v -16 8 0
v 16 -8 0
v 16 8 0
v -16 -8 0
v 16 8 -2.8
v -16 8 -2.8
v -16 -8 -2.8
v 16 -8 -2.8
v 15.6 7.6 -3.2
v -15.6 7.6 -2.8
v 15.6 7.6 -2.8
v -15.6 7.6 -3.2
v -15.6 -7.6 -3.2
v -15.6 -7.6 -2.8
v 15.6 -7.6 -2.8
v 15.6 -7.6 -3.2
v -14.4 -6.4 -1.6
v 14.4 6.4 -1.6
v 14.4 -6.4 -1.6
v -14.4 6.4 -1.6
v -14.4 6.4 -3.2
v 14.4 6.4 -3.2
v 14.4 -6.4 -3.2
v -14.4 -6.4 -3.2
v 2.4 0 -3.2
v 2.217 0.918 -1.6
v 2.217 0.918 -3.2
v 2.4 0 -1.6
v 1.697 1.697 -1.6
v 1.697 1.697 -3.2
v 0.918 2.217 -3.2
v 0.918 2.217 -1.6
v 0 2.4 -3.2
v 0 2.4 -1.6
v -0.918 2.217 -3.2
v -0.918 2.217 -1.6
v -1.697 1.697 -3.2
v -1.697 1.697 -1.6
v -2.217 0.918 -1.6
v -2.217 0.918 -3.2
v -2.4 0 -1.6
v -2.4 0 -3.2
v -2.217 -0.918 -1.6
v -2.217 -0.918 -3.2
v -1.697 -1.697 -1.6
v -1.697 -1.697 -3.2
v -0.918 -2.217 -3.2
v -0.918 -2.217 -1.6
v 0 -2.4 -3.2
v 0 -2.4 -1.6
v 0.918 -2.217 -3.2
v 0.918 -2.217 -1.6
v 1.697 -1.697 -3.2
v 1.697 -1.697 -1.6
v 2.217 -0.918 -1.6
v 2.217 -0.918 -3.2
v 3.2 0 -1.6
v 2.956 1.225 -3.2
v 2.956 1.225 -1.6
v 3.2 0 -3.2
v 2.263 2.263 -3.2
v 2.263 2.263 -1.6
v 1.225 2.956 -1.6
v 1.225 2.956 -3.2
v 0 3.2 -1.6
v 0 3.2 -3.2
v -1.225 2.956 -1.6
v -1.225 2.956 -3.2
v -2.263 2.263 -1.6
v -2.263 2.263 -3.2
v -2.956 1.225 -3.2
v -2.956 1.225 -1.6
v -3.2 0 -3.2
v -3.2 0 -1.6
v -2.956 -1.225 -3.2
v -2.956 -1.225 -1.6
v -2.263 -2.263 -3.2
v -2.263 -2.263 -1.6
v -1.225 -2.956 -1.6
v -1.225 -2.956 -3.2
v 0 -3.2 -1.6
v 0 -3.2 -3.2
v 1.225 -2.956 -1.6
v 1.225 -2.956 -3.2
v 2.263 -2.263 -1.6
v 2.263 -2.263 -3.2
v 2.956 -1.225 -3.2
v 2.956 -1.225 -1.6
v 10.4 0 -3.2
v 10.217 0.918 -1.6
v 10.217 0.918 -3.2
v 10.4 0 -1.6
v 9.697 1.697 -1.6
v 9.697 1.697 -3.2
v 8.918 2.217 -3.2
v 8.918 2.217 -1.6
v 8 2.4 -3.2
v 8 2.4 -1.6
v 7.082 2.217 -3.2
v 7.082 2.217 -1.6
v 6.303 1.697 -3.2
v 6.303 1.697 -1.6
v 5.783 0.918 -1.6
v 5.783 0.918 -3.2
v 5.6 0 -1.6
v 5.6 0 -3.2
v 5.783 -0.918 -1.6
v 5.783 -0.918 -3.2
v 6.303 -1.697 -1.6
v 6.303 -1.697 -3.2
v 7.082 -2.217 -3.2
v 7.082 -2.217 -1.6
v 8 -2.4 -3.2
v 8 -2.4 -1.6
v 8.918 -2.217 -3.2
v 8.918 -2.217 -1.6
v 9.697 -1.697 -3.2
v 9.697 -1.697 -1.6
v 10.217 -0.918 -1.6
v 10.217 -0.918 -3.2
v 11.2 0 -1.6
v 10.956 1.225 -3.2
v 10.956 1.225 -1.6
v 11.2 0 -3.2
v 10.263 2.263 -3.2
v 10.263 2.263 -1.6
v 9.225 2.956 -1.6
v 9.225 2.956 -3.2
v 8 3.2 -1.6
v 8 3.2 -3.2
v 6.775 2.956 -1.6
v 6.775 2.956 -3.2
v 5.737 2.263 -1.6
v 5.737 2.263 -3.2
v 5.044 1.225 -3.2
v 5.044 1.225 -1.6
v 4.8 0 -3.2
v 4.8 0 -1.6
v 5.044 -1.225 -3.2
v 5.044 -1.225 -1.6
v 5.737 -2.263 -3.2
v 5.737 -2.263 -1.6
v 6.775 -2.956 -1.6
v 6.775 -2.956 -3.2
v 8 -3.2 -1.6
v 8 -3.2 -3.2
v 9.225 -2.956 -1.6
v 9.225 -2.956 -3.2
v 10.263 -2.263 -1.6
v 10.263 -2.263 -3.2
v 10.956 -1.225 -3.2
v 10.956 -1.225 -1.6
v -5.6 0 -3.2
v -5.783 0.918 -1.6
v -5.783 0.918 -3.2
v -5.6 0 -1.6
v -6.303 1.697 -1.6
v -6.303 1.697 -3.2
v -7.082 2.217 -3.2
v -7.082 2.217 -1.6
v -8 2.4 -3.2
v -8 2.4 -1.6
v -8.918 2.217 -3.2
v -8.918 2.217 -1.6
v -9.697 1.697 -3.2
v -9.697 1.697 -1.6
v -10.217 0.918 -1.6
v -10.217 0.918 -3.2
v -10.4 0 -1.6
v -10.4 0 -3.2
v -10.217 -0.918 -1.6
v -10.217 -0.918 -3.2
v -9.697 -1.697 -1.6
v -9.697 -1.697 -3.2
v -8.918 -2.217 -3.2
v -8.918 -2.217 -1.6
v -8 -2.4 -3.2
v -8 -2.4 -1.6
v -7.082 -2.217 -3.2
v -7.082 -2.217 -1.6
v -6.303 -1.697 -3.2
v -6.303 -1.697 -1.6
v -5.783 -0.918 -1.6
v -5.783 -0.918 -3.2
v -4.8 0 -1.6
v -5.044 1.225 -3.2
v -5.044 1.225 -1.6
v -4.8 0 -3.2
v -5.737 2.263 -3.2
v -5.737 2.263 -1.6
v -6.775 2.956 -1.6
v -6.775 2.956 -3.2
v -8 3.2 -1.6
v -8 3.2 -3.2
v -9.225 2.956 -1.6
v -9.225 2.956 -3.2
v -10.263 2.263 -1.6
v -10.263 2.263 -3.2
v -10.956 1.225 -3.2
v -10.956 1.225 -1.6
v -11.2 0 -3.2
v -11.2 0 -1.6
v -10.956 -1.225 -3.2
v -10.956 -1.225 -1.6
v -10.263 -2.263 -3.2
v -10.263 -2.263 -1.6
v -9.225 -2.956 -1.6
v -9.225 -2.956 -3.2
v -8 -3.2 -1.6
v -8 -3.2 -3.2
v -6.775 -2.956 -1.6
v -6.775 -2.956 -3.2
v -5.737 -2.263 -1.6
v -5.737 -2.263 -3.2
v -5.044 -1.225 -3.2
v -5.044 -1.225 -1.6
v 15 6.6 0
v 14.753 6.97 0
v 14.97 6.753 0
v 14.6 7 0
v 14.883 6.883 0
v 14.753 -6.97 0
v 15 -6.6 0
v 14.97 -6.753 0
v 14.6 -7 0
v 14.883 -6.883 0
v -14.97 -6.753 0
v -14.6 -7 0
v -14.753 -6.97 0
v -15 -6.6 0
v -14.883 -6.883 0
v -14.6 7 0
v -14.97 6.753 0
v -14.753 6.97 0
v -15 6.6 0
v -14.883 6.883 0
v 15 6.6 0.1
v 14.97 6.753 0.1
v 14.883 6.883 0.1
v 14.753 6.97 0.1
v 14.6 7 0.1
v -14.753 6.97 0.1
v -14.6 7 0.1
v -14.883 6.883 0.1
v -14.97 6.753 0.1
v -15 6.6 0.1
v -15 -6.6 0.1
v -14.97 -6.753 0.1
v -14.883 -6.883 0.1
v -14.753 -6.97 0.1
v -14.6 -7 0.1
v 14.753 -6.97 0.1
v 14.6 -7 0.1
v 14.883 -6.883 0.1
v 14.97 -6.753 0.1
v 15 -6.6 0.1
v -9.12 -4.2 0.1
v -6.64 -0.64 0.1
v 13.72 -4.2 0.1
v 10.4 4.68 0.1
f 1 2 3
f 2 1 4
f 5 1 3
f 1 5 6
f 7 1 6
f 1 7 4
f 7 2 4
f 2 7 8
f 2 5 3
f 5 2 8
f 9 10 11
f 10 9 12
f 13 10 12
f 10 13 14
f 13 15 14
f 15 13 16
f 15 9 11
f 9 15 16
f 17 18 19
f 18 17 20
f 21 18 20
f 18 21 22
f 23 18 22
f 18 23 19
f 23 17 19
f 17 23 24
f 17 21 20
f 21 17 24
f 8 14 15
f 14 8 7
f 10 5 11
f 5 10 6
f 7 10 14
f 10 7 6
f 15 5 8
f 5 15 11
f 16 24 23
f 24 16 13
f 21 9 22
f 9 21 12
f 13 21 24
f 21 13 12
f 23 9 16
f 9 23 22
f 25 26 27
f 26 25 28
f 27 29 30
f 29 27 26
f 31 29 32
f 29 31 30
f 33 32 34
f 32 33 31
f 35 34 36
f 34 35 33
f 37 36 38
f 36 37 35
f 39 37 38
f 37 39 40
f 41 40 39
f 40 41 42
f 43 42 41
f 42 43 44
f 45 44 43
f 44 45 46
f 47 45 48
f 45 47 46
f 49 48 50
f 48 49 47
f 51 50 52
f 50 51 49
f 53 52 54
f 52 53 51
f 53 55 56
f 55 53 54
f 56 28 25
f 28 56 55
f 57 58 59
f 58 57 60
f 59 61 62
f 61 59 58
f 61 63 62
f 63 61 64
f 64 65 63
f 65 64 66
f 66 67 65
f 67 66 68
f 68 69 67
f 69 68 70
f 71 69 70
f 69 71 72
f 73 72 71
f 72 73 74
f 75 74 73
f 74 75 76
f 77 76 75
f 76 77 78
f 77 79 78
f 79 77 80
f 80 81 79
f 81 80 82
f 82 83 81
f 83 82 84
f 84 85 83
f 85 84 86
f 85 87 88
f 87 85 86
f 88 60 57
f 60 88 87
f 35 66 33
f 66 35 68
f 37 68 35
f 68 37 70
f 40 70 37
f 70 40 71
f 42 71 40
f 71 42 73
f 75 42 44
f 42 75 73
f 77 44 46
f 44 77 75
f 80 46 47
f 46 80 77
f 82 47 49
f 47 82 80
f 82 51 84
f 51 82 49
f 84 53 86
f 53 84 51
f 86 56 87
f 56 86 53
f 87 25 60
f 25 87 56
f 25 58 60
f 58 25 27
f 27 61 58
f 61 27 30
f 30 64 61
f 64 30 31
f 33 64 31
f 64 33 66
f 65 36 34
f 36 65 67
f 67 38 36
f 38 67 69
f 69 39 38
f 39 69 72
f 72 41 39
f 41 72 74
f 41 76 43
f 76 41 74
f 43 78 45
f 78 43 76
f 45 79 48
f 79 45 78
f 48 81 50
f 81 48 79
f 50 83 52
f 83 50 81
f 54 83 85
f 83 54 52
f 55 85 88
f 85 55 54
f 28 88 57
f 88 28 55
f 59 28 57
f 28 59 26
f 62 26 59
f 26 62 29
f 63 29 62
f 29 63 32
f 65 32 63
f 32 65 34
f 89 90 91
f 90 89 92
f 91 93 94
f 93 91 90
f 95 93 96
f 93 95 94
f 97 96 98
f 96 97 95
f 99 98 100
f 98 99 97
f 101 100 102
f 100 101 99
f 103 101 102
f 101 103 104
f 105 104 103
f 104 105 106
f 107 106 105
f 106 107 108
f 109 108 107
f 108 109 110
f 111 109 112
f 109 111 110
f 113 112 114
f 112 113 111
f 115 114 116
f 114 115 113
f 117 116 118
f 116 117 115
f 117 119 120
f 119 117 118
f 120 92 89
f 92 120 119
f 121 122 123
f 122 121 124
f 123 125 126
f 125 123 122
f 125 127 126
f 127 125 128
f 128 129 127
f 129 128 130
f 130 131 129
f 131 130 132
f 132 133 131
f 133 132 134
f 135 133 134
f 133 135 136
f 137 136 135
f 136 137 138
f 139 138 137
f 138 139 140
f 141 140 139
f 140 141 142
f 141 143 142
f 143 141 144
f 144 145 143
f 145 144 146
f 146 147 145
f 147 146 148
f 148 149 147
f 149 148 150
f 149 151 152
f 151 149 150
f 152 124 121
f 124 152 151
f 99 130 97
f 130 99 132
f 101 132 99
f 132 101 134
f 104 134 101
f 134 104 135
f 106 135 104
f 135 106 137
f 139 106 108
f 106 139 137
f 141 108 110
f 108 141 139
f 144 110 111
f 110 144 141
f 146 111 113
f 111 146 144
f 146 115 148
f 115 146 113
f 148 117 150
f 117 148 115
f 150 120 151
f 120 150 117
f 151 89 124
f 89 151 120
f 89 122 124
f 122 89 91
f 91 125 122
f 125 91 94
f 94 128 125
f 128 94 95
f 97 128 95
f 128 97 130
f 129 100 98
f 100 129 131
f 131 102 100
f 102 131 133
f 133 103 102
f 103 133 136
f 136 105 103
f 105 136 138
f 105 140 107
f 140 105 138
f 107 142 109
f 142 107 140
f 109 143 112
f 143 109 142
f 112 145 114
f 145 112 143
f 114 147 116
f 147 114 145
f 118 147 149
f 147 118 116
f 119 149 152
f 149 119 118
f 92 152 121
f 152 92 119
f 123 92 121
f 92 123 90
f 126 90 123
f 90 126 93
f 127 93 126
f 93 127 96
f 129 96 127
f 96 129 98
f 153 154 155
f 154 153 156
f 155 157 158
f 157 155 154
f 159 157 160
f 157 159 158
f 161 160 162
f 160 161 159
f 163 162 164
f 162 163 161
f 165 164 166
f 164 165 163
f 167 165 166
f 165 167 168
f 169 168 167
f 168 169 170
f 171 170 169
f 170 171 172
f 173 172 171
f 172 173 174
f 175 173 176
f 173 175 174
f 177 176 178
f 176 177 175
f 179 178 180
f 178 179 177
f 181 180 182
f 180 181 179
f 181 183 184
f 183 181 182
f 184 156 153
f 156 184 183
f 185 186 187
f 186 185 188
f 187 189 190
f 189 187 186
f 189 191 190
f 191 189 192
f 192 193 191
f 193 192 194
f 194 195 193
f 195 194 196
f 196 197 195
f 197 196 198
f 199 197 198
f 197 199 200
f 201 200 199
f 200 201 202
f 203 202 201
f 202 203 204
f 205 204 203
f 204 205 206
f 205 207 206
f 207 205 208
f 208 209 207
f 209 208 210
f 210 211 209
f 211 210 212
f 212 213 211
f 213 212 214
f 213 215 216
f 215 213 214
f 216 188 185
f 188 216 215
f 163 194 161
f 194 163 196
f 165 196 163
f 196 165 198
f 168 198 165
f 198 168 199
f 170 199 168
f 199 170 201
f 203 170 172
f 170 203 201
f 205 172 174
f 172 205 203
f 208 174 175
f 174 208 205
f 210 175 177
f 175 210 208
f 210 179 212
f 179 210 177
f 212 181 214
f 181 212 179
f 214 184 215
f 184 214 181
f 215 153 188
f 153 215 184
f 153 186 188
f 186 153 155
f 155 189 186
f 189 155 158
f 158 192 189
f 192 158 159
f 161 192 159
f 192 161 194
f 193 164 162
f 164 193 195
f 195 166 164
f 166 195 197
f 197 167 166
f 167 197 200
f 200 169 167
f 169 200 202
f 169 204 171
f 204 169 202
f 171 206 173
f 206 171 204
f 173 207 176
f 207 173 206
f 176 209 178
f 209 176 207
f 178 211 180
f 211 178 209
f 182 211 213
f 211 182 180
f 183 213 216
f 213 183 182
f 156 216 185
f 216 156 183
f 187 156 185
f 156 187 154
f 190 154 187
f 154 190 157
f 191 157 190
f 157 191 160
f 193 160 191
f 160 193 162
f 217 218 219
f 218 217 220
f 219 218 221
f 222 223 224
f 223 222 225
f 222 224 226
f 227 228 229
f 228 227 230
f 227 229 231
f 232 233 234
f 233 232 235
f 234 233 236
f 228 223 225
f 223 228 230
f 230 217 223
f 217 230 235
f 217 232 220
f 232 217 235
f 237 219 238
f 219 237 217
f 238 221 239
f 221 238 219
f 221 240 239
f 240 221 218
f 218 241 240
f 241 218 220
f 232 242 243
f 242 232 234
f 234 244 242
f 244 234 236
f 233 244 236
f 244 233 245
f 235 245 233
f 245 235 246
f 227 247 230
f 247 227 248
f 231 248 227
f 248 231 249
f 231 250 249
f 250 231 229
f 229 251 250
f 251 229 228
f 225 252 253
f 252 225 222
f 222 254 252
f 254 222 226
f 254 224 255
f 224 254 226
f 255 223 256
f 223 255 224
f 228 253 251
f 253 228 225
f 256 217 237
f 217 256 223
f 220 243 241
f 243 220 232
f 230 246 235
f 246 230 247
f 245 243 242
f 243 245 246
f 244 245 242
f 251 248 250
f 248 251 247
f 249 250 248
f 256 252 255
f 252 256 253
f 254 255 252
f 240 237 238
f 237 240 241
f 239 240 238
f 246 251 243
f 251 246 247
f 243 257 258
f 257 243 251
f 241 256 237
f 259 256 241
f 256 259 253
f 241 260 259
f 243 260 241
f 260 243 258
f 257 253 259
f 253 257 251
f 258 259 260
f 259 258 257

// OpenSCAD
// file: ../p/4-4ring3.scad
use <../lib.scad>
$fa=1; $fs=0.2;
function ldraw_lib__4_4ring3(realsolid=false) = [
// 0 Ring  3 x 1.0
// 0 Name: 4-4ring3.dat
// 0 Author: James Jessiman
// 0 !LDRAW_ORG Primitive UPDATE 2009-01
// 0 !LICENSE Licensed under CC BY 2.0 and CC BY 4.0 : see CAreadme.txt
// 
// 0 BFC CERTIFY CCW
  [0,"BFC","CERTIFY"],
  [0,"BFC","CCW"],
// 
// 0 !HISTORY 1998-12-15 [PTadmin] Official Update 1998-10
// 0 !HISTORY 2002-04-05 [hafhead] Added BFC statement
// 0 !HISTORY 2002-04-25 [PTadmin] Official Update 2002-02
// 0 !HISTORY 2007-06-24 [PTadmin] Header formatted for Contributor Agreement
// 0 !HISTORY 2008-07-01 [PTadmin] Official Update 2008-01
// 0 !HISTORY 2008-08-26 [cwdee] Switch polygon winding and rename
// 0 !HISTORY 2009-05-02 [PTadmin] Official Update 2009-01
// 
// 
// 4 16 -1.5308 0 3.6956 -1.1481 0 2.7717 0 0 3 0 0 4
  [4,16,-1.5308,0,3.6956,-1.1481,0,2.7717,0,0,3,0,0,4],
// 4 16 -2.8284 0 2.8284 -2.1213 0 2.1213 -1.1481 0 2.7717 -1.5308 0 3.6956
  [4,16,-2.8284,0,2.8284,-2.1213,0,2.1213,-1.1481,0,2.7717,-1.5308,0,3.6956],
// 4 16 -3.6956 0 1.5308 -2.7717 0 1.1481 -2.1213 0 2.1213 -2.8284 0 2.8284
  [4,16,-3.6956,0,1.5308,-2.7717,0,1.1481,-2.1213,0,2.1213,-2.8284,0,2.8284],
// 4 16 -4 0 0 -3 0 0 -2.7717 0 1.1481 -3.6956 0 1.5308
  [4,16,-4,0,0,-3,0,0,-2.7717,0,1.1481,-3.6956,0,1.5308],
// 4 16 -3.6956 0 -1.5308 -2.7717 0 -1.1481 -3 0 0 -4 0 0
  [4,16,-3.6956,0,-1.5308,-2.7717,0,-1.1481,-3,0,0,-4,0,0],
// 4 16 -2.8284 0 -2.8284 -2.1213 0 -2.1213 -2.7717 0 -1.1481 -3.6956 0 -1.5308
  [4,16,-2.8284,0,-2.8284,-2.1213,0,-2.1213,-2.7717,0,-1.1481,-3.6956,0,-1.5308],
// 4 16 -1.5308 0 -3.6956 -1.1481 0 -2.7717 -2.1213 0 -2.1213 -2.8284 0 -2.8284
  [4,16,-1.5308,0,-3.6956,-1.1481,0,-2.7717,-2.1213,0,-2.1213,-2.8284,0,-2.8284],
// 4 16 0 0 -4 0 0 -3 -1.1481 0 -2.7717 -1.5308 0 -3.6956
  [4,16,0,0,-4,0,0,-3,-1.1481,0,-2.7717,-1.5308,0,-3.6956],
// 4 16 1.5308 0 -3.6956 1.1481 0 -2.7717 0 0 -3 0 0 -4
  [4,16,1.5308,0,-3.6956,1.1481,0,-2.7717,0,0,-3,0,0,-4],
// 4 16 2.8284 0 -2.8284 2.1213 0 -2.1213 1.1481 0 -2.7717 1.5308 0 -3.6956
  [4,16,2.8284,0,-2.8284,2.1213,0,-2.1213,1.1481,0,-2.7717,1.5308,0,-3.6956],
// 4 16 3.6956 0 -1.5308 2.7717 0 -1.1481 2.1213 0 -2.1213 2.8284 0 -2.8284
  [4,16,3.6956,0,-1.5308,2.7717,0,-1.1481,2.1213,0,-2.1213,2.8284,0,-2.8284],
// 4 16 4 0 0 3 0 0 2.7717 0 -1.1481 3.6956 0 -1.5308
  [4,16,4,0,0,3,0,0,2.7717,0,-1.1481,3.6956,0,-1.5308],
// 4 16 3.6956 0 1.5308 2.7717 0 1.1481 3 0 0 4 0 0
  [4,16,3.6956,0,1.5308,2.7717,0,1.1481,3,0,0,4,0,0],
// 4 16 2.8284 0 2.8284 2.1213 0 2.1213 2.7717 0 1.1481 3.6956 0 1.5308
  [4,16,2.8284,0,2.8284,2.1213,0,2.1213,2.7717,0,1.1481,3.6956,0,1.5308],
// 4 16 1.5308 0 3.6956 1.1481 0 2.7717 2.1213 0 2.1213 2.8284 0 2.8284
  [4,16,1.5308,0,3.6956,1.1481,0,2.7717,2.1213,0,2.1213,2.8284,0,2.8284],
// 4 16 0 0 4 0 0 3 1.1481 0 2.7717 1.5308 0 3.6956
  [4,16,0,0,4,0,0,3,1.1481,0,2.7717,1.5308,0,3.6956],
// 0
];
module ldraw_lib__4_4ring3(step=0, col=false, unit=2/5, alt=false, line=0.2, solid=!$preview)
    makepoly(ldraw_lib__4_4ring3(solid), step=step, col=col, unit=unit, alt=alt, line=line, solid=solid);
ldraw_lib__4_4ring3(line=0.2);
// file: ../p/4-4edge.scad
use <../lib.scad>
function ldraw_lib__4_4edge() = [
// 0 Circle 1.0
// 0 Name: 4-4edge.dat
// 0 Author: James Jessiman
// 0 !LDRAW_ORG Primitive UPDATE 2017-01
// 0 !LICENSE Licensed under CC BY 2.0 and CC BY 4.0 : see CAreadme.txt
// 
// 0 BFC CERTIFY CCW
  [0,"BFC","CERTIFY"],
  [0,"BFC","CCW"],
// 
// 0 !HISTORY 1998-12-15 [PTadmin] Official Update 1998-10
// 0 !HISTORY 2005-12-28 [PTadmin] Official Update 2005-01
// 0 !HISTORY 2007-06-24 [PTadmin] Header formatted for Contributor Agreement
// 0 !HISTORY 2008-07-01 [PTadmin] Official Update 2008-01
// 0 !HISTORY 2017-01-15 [Steffen] BFCed
// 0 !HISTORY 2017-12-30 [PTadmin] Official Update 2017-01
// 
// 
// 2 24 1 0 0 0.9239 0 0.3827
  [2,24,1,0,0,0.9239,0,0.3827],
// 2 24 0.9239 0 0.3827 0.7071 0 0.7071
  [2,24,0.9239,0,0.3827,0.7071,0,0.7071],
// 2 24 0.7071 0 0.7071 0.3827 0 0.9239
  [2,24,0.7071,0,0.7071,0.3827,0,0.9239],
// 2 24 0.3827 0 0.9239 0 0 1
  [2,24,0.3827,0,0.9239,0,0,1],
// 2 24 0 0 1 -0.3827 0 0.9239
  [2,24,0,0,1,-0.3827,0,0.9239],
// 2 24 -0.3827 0 0.9239 -0.7071 0 0.7071
  [2,24,-0.3827,0,0.9239,-0.7071,0,0.7071],
// 2 24 -0.7071 0 0.7071 -0.9239 0 0.3827
  [2,24,-0.7071,0,0.7071,-0.9239,0,0.3827],
// 2 24 -0.9239 0 0.3827 -1 0 -0
  [2,24,-0.9239,0,0.3827,-1,0,-0],
// 2 24 -1 0 -0 -0.9239 0 -0.3827
  [2,24,-1,0,-0,-0.9239,0,-0.3827],
// 2 24 -0.9239 0 -0.3827 -0.7071 0 -0.7071
  [2,24,-0.9239,0,-0.3827,-0.7071,0,-0.7071],
// 2 24 -0.7071 0 -0.7071 -0.3827 0 -0.9239
  [2,24,-0.7071,0,-0.7071,-0.3827,0,-0.9239],
// 2 24 -0.3827 0 -0.9239 0 0 -1
  [2,24,-0.3827,0,-0.9239,0,0,-1],
// 2 24 0 0 -1 0.3827 0 -0.9239
  [2,24,0,0,-1,0.3827,0,-0.9239],
// 2 24 0.3827 0 -0.9239 0.7071 0 -0.7071
  [2,24,0.3827,0,-0.9239,0.7071,0,-0.7071],
// 2 24 0.7071 0 -0.7071 0.9239 0 -0.3827
  [2,24,0.7071,0,-0.7071,0.9239,0,-0.3827],
// 2 24 0.9239 0 -0.3827 1 0 0
  [2,24,0.9239,0,-0.3827,1,0,0],
];
module ldraw_lib__4_4edge(step=0, col=false, unit=2/5, alt=false, line=0.2, solid=!$preview)
    makepoly(ldraw_lib__4_4edge(), step=step, col=col, unit=unit, alt=alt, line=line, solid=solid);
ldraw_lib__4_4edge(line=0.2);
// file: ../p/4-4cyli.scad
use <../lib.scad>
$fa=1; $fs=0.2;
function ldraw_lib__4_4cyli(realsolid=false) = [
// 0 Cylinder 1.0
// 0 Name: 4-4cyli.dat
// 0 Author: James Jessiman
// 0 !LDRAW_ORG Primitive UPDATE 2005-01
// 0 !LICENSE Licensed under CC BY 2.0 and CC BY 4.0 : see CAreadme.txt
// 
// 0 BFC CERTIFY CCW
  [0,"BFC","CERTIFY"],
  [0,"BFC","CCW"],
// 
// 0 !HISTORY 1998-12-15 [PTadmin] Official Update 1998-10
// 0 !HISTORY 2002-03-23 [sbliss] Added BFC statement; merged headers from files in distributions LDraw 0.27 and Complete.
// 0 !HISTORY 2002-04-25 [PTadmin] Official Update 2002-02
// 0 !HISTORY 2004-12-14 [guyvivan] BFC CCW
// 0 !HISTORY 2005-12-28 [PTadmin] Official Update 2005-01
// 0 !HISTORY 2007-06-24 [PTadmin] Header formatted for Contributor Agreement
// 0 !HISTORY 2008-07-01 [PTadmin] Official Update 2008-01
// 
// 
// 4 16 1 1 0 0.9239 1 0.3827 0.9239 0 0.3827 1 0 0
  [4,16,1,1,0,0.9239,1,0.3827,0.9239,0,0.3827,1,0,0],
// 5 24 1 0 0 1 1 0 0.9239 0 0.3827 0.9239 0 -0.3827
  [5,24,1,0,0,1,1,0,0.9239,0,0.3827,0.9239,0,-0.3827],
// 4 16 0.9239 1 0.3827 0.7071 1 0.7071 0.7071 0 0.7071 0.9239 0 0.3827
  [4,16,0.9239,1,0.3827,0.7071,1,0.7071,0.7071,0,0.7071,0.9239,0,0.3827],
// 5 24 0.9239 0 0.3827 0.9239 1 0.3827 0.7071 0 0.7071 1 0 0
  [5,24,0.9239,0,0.3827,0.9239,1,0.3827,0.7071,0,0.7071,1,0,0],
// 4 16 0.7071 1 0.7071 0.3827 1 0.9239 0.3827 0 0.9239 0.7071 0 0.7071
  [4,16,0.7071,1,0.7071,0.3827,1,0.9239,0.3827,0,0.9239,0.7071,0,0.7071],
// 5 24 0.7071 0 0.7071 0.7071 1 0.7071 0.3827 0 0.9239 0.9239 0 0.3827
  [5,24,0.7071,0,0.7071,0.7071,1,0.7071,0.3827,0,0.9239,0.9239,0,0.3827],
// 4 16 0.3827 1 0.9239 0 1 1 0 0 1 0.3827 0 0.9239
  [4,16,0.3827,1,0.9239,0,1,1,0,0,1,0.3827,0,0.9239],
// 5 24 0.3827 0 0.9239 0.3827 1 0.9239 0 0 1 0.7071 0 0.7071
  [5,24,0.3827,0,0.9239,0.3827,1,0.9239,0,0,1,0.7071,0,0.7071],
// 4 16 0 1 1 -0.3827 1 0.9239 -0.3827 0 0.9239 0 0 1
  [4,16,0,1,1,-0.3827,1,0.9239,-0.3827,0,0.9239,0,0,1],
// 5 24 0 0 1 0 1 1 -0.3827 0 0.9239 0.3827 0 0.9239
  [5,24,0,0,1,0,1,1,-0.3827,0,0.9239,0.3827,0,0.9239],
// 4 16 -0.3827 1 0.9239 -0.7071 1 0.7071 -0.7071 0 0.7071 -0.3827 0 0.9239
  [4,16,-0.3827,1,0.9239,-0.7071,1,0.7071,-0.7071,0,0.7071,-0.3827,0,0.9239],
// 5 24 -0.3827 0 0.9239 -0.3827 1 0.9239 -0.7071 0 0.7071 0 0 1
  [5,24,-0.3827,0,0.9239,-0.3827,1,0.9239,-0.7071,0,0.7071,0,0,1],
// 4 16 -0.7071 1 0.7071 -0.9239 1 0.3827 -0.9239 0 0.3827 -0.7071 0 0.7071
  [4,16,-0.7071,1,0.7071,-0.9239,1,0.3827,-0.9239,0,0.3827,-0.7071,0,0.7071],
// 5 24 -0.7071 0 0.7071 -0.7071 1 0.7071 -0.9239 0 0.3827 -0.3827 0 0.9239
  [5,24,-0.7071,0,0.7071,-0.7071,1,0.7071,-0.9239,0,0.3827,-0.3827,0,0.9239],
// 4 16 -0.9239 1 0.3827 -1 1 0 -1 0 0 -0.9239 0 0.3827
  [4,16,-0.9239,1,0.3827,-1,1,0,-1,0,0,-0.9239,0,0.3827],
// 5 24 -0.9239 0 0.3827 -0.9239 1 0.3827 -1 0 0 -0.7071 0 0.7071
  [5,24,-0.9239,0,0.3827,-0.9239,1,0.3827,-1,0,0,-0.7071,0,0.7071],
// 4 16 -1 1 0 -0.9239 1 -0.3827 -0.9239 0 -0.3827 -1 0 0
  [4,16,-1,1,0,-0.9239,1,-0.3827,-0.9239,0,-0.3827,-1,0,0],
// 5 24 -1 0 0 -1 1 0 -0.9239 0 -0.3827 -0.9239 0 0.3827
  [5,24,-1,0,0,-1,1,0,-0.9239,0,-0.3827,-0.9239,0,0.3827],
// 4 16 -0.9239 1 -0.3827 -0.7071 1 -0.7071 -0.7071 0 -0.7071 -0.9239 0 -0.3827
  [4,16,-0.9239,1,-0.3827,-0.7071,1,-0.7071,-0.7071,0,-0.7071,-0.9239,0,-0.3827],
// 5 24 -0.9239 0 -0.3827 -0.9239 1 -0.3827 -0.7071 0 -0.7071 -1 0 0
  [5,24,-0.9239,0,-0.3827,-0.9239,1,-0.3827,-0.7071,0,-0.7071,-1,0,0],
// 4 16 -0.7071 1 -0.7071 -0.3827 1 -0.9239 -0.3827 0 -0.9239 -0.7071 0 -0.7071
  [4,16,-0.7071,1,-0.7071,-0.3827,1,-0.9239,-0.3827,0,-0.9239,-0.7071,0,-0.7071],
// 5 24 -0.7071 0 -0.7071 -0.7071 1 -0.7071 -0.3827 0 -0.9239 -0.9239 0 -0.3827
  [5,24,-0.7071,0,-0.7071,-0.7071,1,-0.7071,-0.3827,0,-0.9239,-0.9239,0,-0.3827],
// 4 16 -0.3827 1 -0.9239 0 1 -1 0 0 -1 -0.3827 0 -0.9239
  [4,16,-0.3827,1,-0.9239,0,1,-1,0,0,-1,-0.3827,0,-0.9239],
// 5 24 -0.3827 0 -0.9239 -0.3827 1 -0.9239 0 0 -1 -0.7071 0 -0.7071
  [5,24,-0.3827,0,-0.9239,-0.3827,1,-0.9239,0,0,-1,-0.7071,0,-0.7071],
// 4 16 0 1 -1 0.3827 1 -0.9239 0.3827 0 -0.9239 0 0 -1
  [4,16,0,1,-1,0.3827,1,-0.9239,0.3827,0,-0.9239,0,0,-1],
// 5 24 0 0 -1 0 1 -1 0.3827 0 -0.9239 -0.3827 0 -0.9239
  [5,24,0,0,-1,0,1,-1,0.3827,0,-0.9239,-0.3827,0,-0.9239],
// 4 16 0.3827 1 -0.9239 0.7071 1 -0.7071 0.7071 0 -0.7071 0.3827 0 -0.9239
  [4,16,0.3827,1,-0.9239,0.7071,1,-0.7071,0.7071,0,-0.7071,0.3827,0,-0.9239],
// 5 24 0.3827 0 -0.9239 0.3827 1 -0.9239 0.7071 0 -0.7071 0 0 -1
  [5,24,0.3827,0,-0.9239,0.3827,1,-0.9239,0.7071,0,-0.7071,0,0,-1],
// 4 16 0.7071 1 -0.7071 0.9239 1 -0.3827 0.9239 0 -0.3827 0.7071 0 -0.7071
  [4,16,0.7071,1,-0.7071,0.9239,1,-0.3827,0.9239,0,-0.3827,0.7071,0,-0.7071],
// 5 24 0.7071 0 -0.7071 0.7071 1 -0.7071 0.9239 0 -0.3827 0.3827 0 -0.9239
  [5,24,0.7071,0,-0.7071,0.7071,1,-0.7071,0.9239,0,-0.3827,0.3827,0,-0.9239],
// 4 16 0.9239 1 -0.3827 1 1 0 1 0 0 0.9239 0 -0.3827
  [4,16,0.9239,1,-0.3827,1,1,0,1,0,0,0.9239,0,-0.3827],
// 5 24 0.9239 0 -0.3827 0.9239 1 -0.3827 1 0 0 0.7071 0 -0.7071
  [5,24,0.9239,0,-0.3827,0.9239,1,-0.3827,1,0,0,0.7071,0,-0.7071],
// 0
];
module ldraw_lib__4_4cyli(step=0, col=false, unit=2/5, alt=false, line=0.2, solid=!$preview)
    makepoly(ldraw_lib__4_4cyli(solid), step=step, col=col, unit=unit, alt=alt, line=line, solid=solid);
ldraw_lib__4_4cyli(line=0.2);
// file: ../p/stud4.scad
use <../lib.scad>
use <4-4cyli.scad>
use <4-4edge.scad>
use <4-4ring3.scad>
function ldraw_lib__stud4() = [
// 0 Stud Tube Open
// 0 Name: stud4.dat
// 0 Author: James Jessiman
// 0 !LDRAW_ORG Primitive UPDATE 2009-02
// 0 !LICENSE Licensed under CC BY 4.0 : see CAreadme.txt
// 
// 0 BFC CERTIFY CCW
  [0,"BFC","CERTIFY"],
  [0,"BFC","CCW"],
// 
// 0 !HISTORY 1999-07-05 [PTadmin] Official Update 1999-05
// 0 !HISTORY 2002-04-04 [sbliss] Modified for BFC compliance
// 0 !HISTORY 2002-04-25 [PTadmin] Official Update 2002-02
// 0 !HISTORY 2007-06-24 [PTadmin] Header formatted for Contributor Agreement
// 0 !HISTORY 2008-07-01 [PTadmin] Official Update 2008-01
// 0 !HISTORY 2009-06-21 [cwdee] Update ring references to 4-4ring
// 0 !HISTORY 2009-09-03 [PTadmin] Official Update 2009-02
// 
// 
// 1 16 0 -4 0 6 0 0 0 1 0 0 0 6 4-4edge.dat
  [1,16,0,-4,0,6,0,0,0,1,0,0,0,6, ldraw_lib__4_4edge()],
// 1 16 0 -4 0 8 0 0 0 1 0 0 0 8 4-4edge.dat
  [1,16,0,-4,0,8,0,0,0,1,0,0,0,8, ldraw_lib__4_4edge()],
// 1 16 0 0 0 6 0 0 0 1 0 0 0 6 4-4edge.dat
  [1,16,0,0,0,6,0,0,0,1,0,0,0,6, ldraw_lib__4_4edge()],
// 1 16 0 0 0 8 0 0 0 1 0 0 0 8 4-4edge.dat
  [1,16,0,0,0,8,0,0,0,1,0,0,0,8, ldraw_lib__4_4edge()],
// 0 BFC INVERTNEXT
  [0,"BFC","INVERTNEXT"],
// 1 16 0 -4 0 6 0 0 0 4 0 0 0 6 4-4cyli.dat
  [1,16,0,-4,0,6,0,0,0,4,0,0,0,6, ldraw_lib__4_4cyli()],
// 1 16 0 -4 0 8 0 0 0 4 0 0 0 8 4-4cyli.dat
  [1,16,0,-4,0,8,0,0,0,4,0,0,0,8, ldraw_lib__4_4cyli()],
// 1 16 0 -4 0 2 0 0 0 1 0 0 0 2 4-4ring3.dat
  [1,16,0,-4,0,2,0,0,0,1,0,0,0,2, ldraw_lib__4_4ring3()],
  [-1,16,0,0,0,2,0,0,0,-1,0,0,0,2, ldraw_lib__4_4ring3()],
// 0
];
module ldraw_lib__stud4(step=0, col=false, unit=2/5, alt=false, line=0.2, solid=!$preview)
    makepoly(ldraw_lib__stud4(), step=step, col=col, unit=unit, alt=alt, line=line, solid=solid);
ldraw_lib__stud4(line=0.2);
// file: ../p/box5.scad
use <../lib.scad>
function ldraw_lib__box5() = [
// 0 Box with 5 Faces and All Edges
// 0 Name: box5.dat
// 0 Author: James Jessiman
// 0 !LDRAW_ORG Primitive UPDATE 2012-01
// 0 !LICENSE Licensed under CC BY 2.0 and CC BY 4.0 : see CAreadme.txt
// 
// 0 BFC CERTIFY CCW
  [0,"BFC","CERTIFY"],
  [0,"BFC","CCW"],
// 
// 0 !HISTORY 2002-04-03 [sbliss] Modified for BFC compliance
// 0 !HISTORY 2002-04-25 [PTadmin] Official Update 2002-02
// 0 !HISTORY 2007-06-24 [PTadmin] Header formatted for Contributor Agreement
// 0 !HISTORY 2008-07-01 [PTadmin] Official Update 2008-01
// 0 !HISTORY 2012-02-16 [Philo] Changed to CCW
// 0 !HISTORY 2012-03-30 [PTadmin] Official Update 2012-01
// 
// 
// 2 24 1 1 1 -1 1 1
  [2,24,1,1,1,-1,1,1],
// 2 24 -1 1 1 -1 1 -1
  [2,24,-1,1,1,-1,1,-1],
// 2 24 -1 1 -1 1 1 -1
  [2,24,-1,1,-1,1,1,-1],
// 2 24 1 1 -1 1 1 1
  [2,24,1,1,-1,1,1,1],
// 2 24 1 0 1 -1 0 1
  [2,24,1,0,1,-1,0,1],
// 2 24 -1 0 1 -1 0 -1
  [2,24,-1,0,1,-1,0,-1],
// 2 24 -1 0 -1 1 0 -1
  [2,24,-1,0,-1,1,0,-1],
// 2 24 1 0 -1 1 0 1
  [2,24,1,0,-1,1,0,1],
// 2 24 1 0 1 1 1 1
  [2,24,1,0,1,1,1,1],
// 2 24 -1 0 1 -1 1 1
  [2,24,-1,0,1,-1,1,1],
// 2 24 1 0 -1 1 1 -1
  [2,24,1,0,-1,1,1,-1],
// 2 24 -1 0 -1 -1 1 -1
  [2,24,-1,0,-1,-1,1,-1],
// 4 16 -1 1 1 1 1 1 1 1 -1 -1 1 -1
  [4,16,-1,1,1,1,1,1,1,1,-1,-1,1,-1],
// 4 16 -1 1 1 -1 0 1 1 0 1 1 1 1
  [4,16,-1,1,1,-1,0,1,1,0,1,1,1,1],
// 4 16 -1 1 -1 -1 0 -1 -1 0 1 -1 1 1
  [4,16,-1,1,-1,-1,0,-1,-1,0,1,-1,1,1],
// 4 16 1 1 -1 1 0 -1 -1 0 -1 -1 1 -1
  [4,16,1,1,-1,1,0,-1,-1,0,-1,-1,1,-1],
// 4 16 1 1 1 1 0 1 1 0 -1 1 1 -1
  [4,16,1,1,1,1,0,1,1,0,-1,1,1,-1],
];
makepoly(ldraw_lib__box5(), line=0.2);
// file: ../p/box4.scad
use <../lib.scad>
function ldraw_lib__box4() = [
// 0 Box with 4 Faces (2 Parallel Pairs) and All Edges
// 0 Name: box4.dat
// 0 Author: James Jessiman
// 0 !LDRAW_ORG Primitive UPDATE 2012-01
// 0 !LICENSE Licensed under CC BY 4.0 : see CAreadme.txt
// 
// 0 BFC CERTIFY CCW
  [0,"BFC","CERTIFY"],
  [0,"BFC","CCW"],
// 
// 0 !HISTORY 2002-04-03 [sbliss] Modified for BFC compliance
// 0 !HISTORY 2002-04-25 [PTadmin] Official Update 2002-02
// 0 !HISTORY 2007-06-24 [PTadmin] Header formatted for Contributor Agreement
// 0 !HISTORY 2008-07-01 [PTadmin] Official Update 2008-01
// 0 !HISTORY 2012-02-16 [Philo] Changed to CCW
// 0 !HISTORY 2012-03-30 [PTadmin] Official Update 2012-01
// 
// 
// 2 24 1 1 1 -1 1 1
  [2,24,1,1,1,-1,1,1],
// 2 24 -1 1 1 -1 1 -1
  [2,24,-1,1,1,-1,1,-1],
// 2 24 -1 1 -1 1 1 -1
  [2,24,-1,1,-1,1,1,-1],
// 2 24 1 1 -1 1 1 1
  [2,24,1,1,-1,1,1,1],
// 2 24 1 0 1 -1 0 1
  [2,24,1,0,1,-1,0,1],
// 2 24 -1 0 1 -1 0 -1
  [2,24,-1,0,1,-1,0,-1],
// 2 24 -1 0 -1 1 0 -1
  [2,24,-1,0,-1,1,0,-1],
// 2 24 1 0 -1 1 0 1
  [2,24,1,0,-1,1,0,1],
// 2 24 1 0 1 1 1 1
  [2,24,1,0,1,1,1,1],
// 2 24 -1 0 1 -1 1 1
  [2,24,-1,0,1,-1,1,1],
// 2 24 1 0 -1 1 1 -1
  [2,24,1,0,-1,1,1,-1],
// 2 24 -1 0 -1 -1 1 -1
  [2,24,-1,0,-1,-1,1,-1],
// 4 16 -1 1 1 -1 0 1 1 0 1 1 1 1
  [4,16,-1,1,1,-1,0,1,1,0,1,1,1,1],
// 4 16 -1 1 -1 -1 0 -1 -1 0 1 -1 1 1
  [4,16,-1,1,-1,-1,0,-1,-1,0,1,-1,1,1],
// 4 16 1 1 -1 1 0 -1 -1 0 -1 -1 1 -1
  [4,16,1,1,-1,1,0,-1,-1,0,-1,-1,1,-1],
// 4 16 1 1 1 1 0 1 1 0 -1 1 1 -1
  [4,16,1,1,1,1,0,1,1,0,-1,1,1,-1],
];
module ldraw_lib__box4(step=0, col=false, unit=2/5, alt=false, line=0.2, solid=!$preview)
    makepoly(ldraw_lib__box4(), step=step, col=col, unit=unit, alt=alt, line=line, solid=solid);
ldraw_lib__box4(line=0.2);
// file: s/87079s01.scad
use <../../lib.scad>
use <../../p/box4.scad>
use <../../p/box5.scad>
use <../../p/stud4.scad>
function ldraw_lib__s__87079s01() = [
// 0 ~Tile  2 x  4 with Groove without Top
// 0 Name: s\87079s01.dat
// 0 Author: Philippe Hurbain [Philo]
// 0 !LDRAW_ORG Subpart UPDATE 2012-03
// 0 !LICENSE Licensed under CC BY 4.0 : see CAreadme.txt
// 
// 0 BFC CERTIFY CCW
  [0,"BFC","CERTIFY"],
  [0,"BFC","CCW"],
// 
// 0 !HISTORY 2012-09-30 [Philo] Subparted from Tim Gould's original design
// 0 !HISTORY 2012-12-28 [PTadmin] Official Update 2012-03
// 
// 
// 1 16 0 0 0 40 0 0 0 7 0 0 0 20 box4.dat
  [1,16,0,0,0,40,0,0,0,7,0,0,0,20, ldraw_lib__box4()],
// 1 16 0 7 0 39 0 0 0 1 0 0 0 19 box4.dat
  [1,16,0,7,0,39,0,0,0,1,0,0,0,19, ldraw_lib__box4()],
// 0 BFC INVERTNEXT
  [0,"BFC","INVERTNEXT"],
// 1 16 0 8 0 -36 0 0 0 -4 0 0 0 16 box5.dat
  [1,16,0,8,0,-36,0,0,0,-4,0,0,0,16, ldraw_lib__box5()],
// 4 16 -40 7 -20 -39 7 -19 39 7 -19 40 7 -20
  [4,16,-40,7,-20,-39,7,-19,39,7,-19,40,7,-20],
// 4 16 40 7 20 39 7 19 -39 7 19 -40 7 20
  [4,16,40,7,20,39,7,19,-39,7,19,-40,7,20],
// 4 16 -40 7 -20 -40 7 20 -39 7 19 -39 7 -19
  [4,16,-40,7,-20,-40,7,20,-39,7,19,-39,7,-19],
// 4 16 40 7 20 40 7 -20 39 7 -19 39 7 19
  [4,16,40,7,20,40,7,-20,39,7,-19,39,7,19],
// 4 16 -39 8 -19 -36 8 -16 36 8 -16 39 8 -19
  [4,16,-39,8,-19,-36,8,-16,36,8,-16,39,8,-19],
// 4 16 39 8 19 36 8 16 -36 8 16 -39 8 19
  [4,16,39,8,19,36,8,16,-36,8,16,-39,8,19],
// 4 16 -39 8 -19 -39 8 19 -36 8 16 -36 8 -16
  [4,16,-39,8,-19,-39,8,19,-36,8,16,-36,8,-16],
// 4 16 39 8 19 39 8 -19 36 8 -16 36 8 16
  [4,16,39,8,19,39,8,-19,36,8,-16,36,8,16],
// 1 16 0 4 0 1 0 0 0 -1 0 0 0 1 stud4.dat
  [1,16,0,4,0,1,0,0,0,-1,0,0,0,1, ldraw_lib__stud4()],
// 1 16 20 4 0 1 0 0 0 -1 0 0 0 1 stud4.dat
  [1,16,20,4,0,1,0,0,0,-1,0,0,0,1, ldraw_lib__stud4()],
// 1 16 -20 4 0 1 0 0 0 -1 0 0 0 1 stud4.dat
  [1,16,-20,4,0,1,0,0,0,-1,0,0,0,1, ldraw_lib__stud4()],
];
module ldraw_lib__s__87079s01(step=0, col=false, unit=2/5, alt=false, line=0.2, solid=!$preview)
    makepoly(ldraw_lib__s__87079s01(), step=step, col=col, unit=unit, alt=alt, line=line, solid=solid);
ldraw_lib__s__87079s01(line=0.2);
// file: ../p/1-4cyli.scad
use <../lib.scad>
function ldraw_lib__1_4cyli() = [
// 0 Cylinder 0.25
// 0 Name: 1-4cyli.dat
// 0 Author: James Jessiman
// 0 !LDRAW_ORG Primitive UPDATE 2012-01
// 0 !LICENSE Licensed under CC BY 2.0 and CC BY 4.0 : see CAreadme.txt
// 
// 0 BFC CERTIFY CCW
  [0,"BFC","CERTIFY"],
  [0,"BFC","CCW"],
// 
// 0 !HISTORY 2002-03-23 [sbliss] Added BFC statement.
// 0 !HISTORY 2002-04-25 [PTadmin] Official Update 2002-02
// 0 !HISTORY 2007-06-22 [PTadmin] Header formatted for Contributor Agreement
// 0 !HISTORY 2008-07-01 [PTadmin] Official Update 2008-01
// 0 !HISTORY 2012-02-16 [Philo] Changed to CCW
// 0 !HISTORY 2012-03-30 [PTadmin] Official Update 2012-01
// 
// 
// 4 16 1 1 0 0.9239 1 0.3827 0.9239 0 0.3827 1 0 0
  [4,16,1,1,0,0.9239,1,0.3827,0.9239,0,0.3827,1,0,0],
// 5 24 1 0 0 1 1 0 0.9239 0 0.3827 1 0 -1
  [5,24,1,0,0,1,1,0,0.9239,0,0.3827,1,0,-1],
// 4 16 0.9239 1 0.3827 0.7071 1 0.7071 0.7071 0 0.7071 0.9239 0 0.3827
  [4,16,0.9239,1,0.3827,0.7071,1,0.7071,0.7071,0,0.7071,0.9239,0,0.3827],
// 5 24 0.9239 0 0.3827 0.9239 1 0.3827 0.7071 0 0.7071 1 0 0
  [5,24,0.9239,0,0.3827,0.9239,1,0.3827,0.7071,0,0.7071,1,0,0],
// 4 16 0.7071 1 0.7071 0.3827 1 0.9239 0.3827 0 0.9239 0.7071 0 0.7071
  [4,16,0.7071,1,0.7071,0.3827,1,0.9239,0.3827,0,0.9239,0.7071,0,0.7071],
// 5 24 0.7071 0 0.7071 0.7071 1 0.7071 0.3827 0 0.9239 0.9239 0 0.3827
  [5,24,0.7071,0,0.7071,0.7071,1,0.7071,0.3827,0,0.9239,0.9239,0,0.3827],
// 4 16 0.3827 1 0.9239 0 1 1 0 0 1 0.3827 0 0.9239
  [4,16,0.3827,1,0.9239,0,1,1,0,0,1,0.3827,0,0.9239],
// 5 24 0.3827 0 0.9239 0.3827 1 0.9239 0 0 1 0.7071 0 0.7071
  [5,24,0.3827,0,0.9239,0.3827,1,0.9239,0,0,1,0.7071,0,0.7071],
// 5 24 0 0 1 0 1 1 0.3827 0 0.9239 -1 0 1
  [5,24,0,0,1,0,1,1,0.3827,0,0.9239,-1,0,1],
];
module ldraw_lib__1_4cyli(step=0, col=false, unit=2/5, alt=false, line=0.2, solid=!$preview)
    makepoly(ldraw_lib__1_4cyli(), step=step, col=col, unit=unit, alt=alt, line=line, solid=solid);
ldraw_lib__1_4cyli(line=0.2);
// file: ../p/1-4chrd.scad
use <../lib.scad>
$fa=1; $fs=0.2;
function ldraw_lib__1_4chrd(realsolid=false) = [
// 0 Chord 0.25
// 0 Name: 1-4chrd.dat
// 0 Author: Tony Hafner [hafhead]
// 0 !LDRAW_ORG Primitive UPDATE 2012-02
// 0 !LICENSE Licensed under CC BY 2.0 and CC BY 4.0 : see CAreadme.txt
// 
// 0 BFC CERTIFY CCW
  [0,"BFC","CERTIFY"],
  [0,"BFC","CCW"],
// 
// 0 !HISTORY 2004-04-22 [PTadmin] Official Update 2004-02
// 0 !HISTORY 2007-10-09 [PTadmin] Header formatted for Contributor Agreement
// 0 !HISTORY 2008-07-01 [PTadmin] Official Update 2008-01
// 0 !HISTORY 2012-08-02 [MMR1988] Re-creation with PrimGen2 and Rectifier
// 0 !HISTORY 2012-08-09 [PTadmin] Official Update 2012-02
// 
// 
// 4 16 0.9239 0 0.3827 0.3827 0 0.9239 0 0 1 1 0 0
  [4,16,0.9239,0,0.3827,0.3827,0,0.9239,0,0,1,1,0,0],
// 3 16 0.7071 0 0.7071 0.3827 0 0.9239 0.9239 0 0.3827
  [3,16,0.7071,0,0.7071,0.3827,0,0.9239,0.9239,0,0.3827],
];
module ldraw_lib__1_4chrd(step=0, col=false, unit=2/5, alt=false, line=0.2, solid=!$preview)
    makepoly(ldraw_lib__1_4chrd(solid), step=step, col=col, unit=unit, alt=alt, line=line, solid=solid);
ldraw_lib__1_4chrd(line=0.2);
// file: 87079.scad
use <../lib.scad>
use <s/87079s01.scad>
function ldraw_lib__87079() = [
// 0 Tile  2 x  4 with Groove
// 0 Name: 87079.dat
// 0 Author: Tim Gould [timgould]
// 0 !LDRAW_ORG Part UPDATE 2012-03
// 0 !LICENSE Licensed under CC BY 4.0 : see CAreadme.txt
// 
// 0 BFC CERTIFY CCW
  [0,"BFC","CERTIFY"],
  [0,"BFC","CCW"],
// 
// 0 !HISTORY 2010-04-05 [PTadmin] Official Update 2010-01
// 0 !HISTORY 2012-09-30 [Philo] Subparted for patterns
// 0 !HISTORY 2012-12-28 [PTadmin] Official Update 2012-03
// 
// 
// 4 16 -40 0 -20 40 0 -20 40 0 20 -40 0 20
  [4,16,-40,0,-20,40,0,-20,40,0,20,-40,0,20],
// 1 16 0 0 0 1 0 0 0 1 0 0 0 1 s\87079s01.dat
  [1,16,0,0,0,1,0,0,0,1,0,0,0,1, ldraw_lib__s__87079s01()],
];
module ldraw_lib__87079(step=0, col=false, unit=2/5, alt=false, line=0.2, solid=!$preview)
    makepoly(ldraw_lib__87079(), step=step, col=col, unit=unit, alt=alt, line=line, solid=solid);
ldraw_lib__87079(line=0.2);
// file: 6347356m.scad
use <../lib.scad>
use <../p/1-4chrd.scad>
use <../p/1-4cyli.scad>
function ldraw_lib__6347356m() = [
// 0 Sticker  1.7 x  3.7 with Bright Light Orange Trapezoid Left
// 0 Name: 6347356m.dat
// 0 Author: Evert-Jan Boer [ejboer]
// 0 !LDRAW_ORG Part UPDATE 2024-06
// 0 !LICENSE Licensed under CC BY 4.0 : see CAreadme.txt
// 
// 0 BFC CERTIFY CCW
  [0,"BFC","CERTIFY"],
  [0,"BFC","CCW"],
// 
// 0 !KEYWORDS Republic Gunship, Set 75309, Star Wars
// 
// 0 !HISTORY 2024-07-29 [OrionP] Official Update 2024-06
// 
// 1 16 36.5 0 16.5 1 0 0 0 -1 0 0 0 1 1-4chrd.dat
  [1,16,36.5,0,16.5,1,0,0,0,-1,0,0,0,1, ldraw_lib__1_4chrd()],
// 1 16 36.5 0 -16.5 0 0 1 0 -1 0 -1 0 0 1-4chrd.dat
  [1,16,36.5,0,-16.5,0,0,1,0,-1,0,-1,0,0, ldraw_lib__1_4chrd()],
// 1 16 -36.5 0 -16.5 -1 0 0 0 -1 0 0 0 -1 1-4chrd.dat
  [1,16,-36.5,0,-16.5,-1,0,0,0,-1,0,0,0,-1, ldraw_lib__1_4chrd()],
// 1 16 -36.5 0 16.5 0 0 -1 0 -1 0 1 0 0 1-4chrd.dat
  [1,16,-36.5,0,16.5,0,0,-1,0,-1,0,1,0,0, ldraw_lib__1_4chrd()],
// 4 16 36.5 0 -17.5 -36.5 0 -17.5 -37.5 0 -16.5 37.5 0 -16.5
  [4,16,36.5,0,-17.5,-36.5,0,-17.5,-37.5,0,-16.5,37.5,0,-16.5],
// 4 16 37.5 0 16.5 37.5 0 -16.5 -37.5 0 -16.5 -37.5 0 16.5
  [4,16,37.5,0,16.5,37.5,0,-16.5,-37.5,0,-16.5,-37.5,0,16.5],
// 4 16 37.5 0 16.5 -37.5 0 16.5 -36.5 0 17.5 36.5 0 17.5
  [4,16,37.5,0,16.5,-37.5,0,16.5,-36.5,0,17.5,36.5,0,17.5],
// 
// 1 16 36.5 -.25 16.5 1 0 0 0 .25 0 0 0 1 1-4cyli.dat
  [1,16,36.5,-.25,16.5,1,0,0,0,.25,0,0,0,1, ldraw_lib__1_4cyli()],
// 1 16 -36.5 -.25 16.5 0 0 -1 0 .25 0 1 0 0 1-4cyli.dat
  [1,16,-36.5,-.25,16.5,0,0,-1,0,.25,0,1,0,0, ldraw_lib__1_4cyli()],
// 1 16 -36.5 -.25 -16.5 -1 0 0 0 .25 0 0 0 -1 1-4cyli.dat
  [1,16,-36.5,-.25,-16.5,-1,0,0,0,.25,0,0,0,-1, ldraw_lib__1_4cyli()],
// 1 16 36.5 -.25 -16.5 0 0 1 0 .25 0 -1 0 0 1-4cyli.dat
  [1,16,36.5,-.25,-16.5,0,0,1,0,.25,0,-1,0,0, ldraw_lib__1_4cyli()],
// 4 16 36.5 -.25 -17.5 -36.5 -.25 -17.5 -36.5 0 -17.5 36.5 0 -17.5
  [4,16,36.5,-.25,-17.5,-36.5,-.25,-17.5,-36.5,0,-17.5,36.5,0,-17.5],
// 4 16 37.5 -.25 16.5 37.5 -.25 -16.5 37.5 0 -16.5 37.5 0 16.5
  [4,16,37.5,-.25,16.5,37.5,-.25,-16.5,37.5,0,-16.5,37.5,0,16.5],
// 4 16 -36.5 -.25 17.5 36.5 -.25 17.5 36.5 0 17.5 -36.5 0 17.5
  [4,16,-36.5,-.25,17.5,36.5,-.25,17.5,36.5,0,17.5,-36.5,0,17.5],
// 4 16 -37.5 -.25 -16.5 -37.5 -.25 16.5 -37.5 0 16.5 -37.5 0 -16.5
  [4,16,-37.5,-.25,-16.5,-37.5,-.25,16.5,-37.5,0,16.5,-37.5,0,-16.5],
// 
// 1 16 -36.5 -.25 16.5 0 0 -1 0 1 0 1 0 0 1-4chrd.dat
  [1,16,-36.5,-.25,16.5,0,0,-1,0,1,0,1,0,0, ldraw_lib__1_4chrd()],
// 1 16 -36.5 -.25 -16.5 -1 0 0 0 1 0 0 0 -1 1-4chrd.dat
  [1,16,-36.5,-.25,-16.5,-1,0,0,0,1,0,0,0,-1, ldraw_lib__1_4chrd()],
// 1 16 36.5 -.25 -16.5 0 0 1 0 1 0 -1 0 0 1-4chrd.dat
  [1,16,36.5,-.25,-16.5,0,0,1,0,1,0,-1,0,0, ldraw_lib__1_4chrd()],
// 1 16 36.5 -.25 16.5 1 0 0 0 1 0 0 0 1 1-4chrd.dat
  [1,16,36.5,-.25,16.5,1,0,0,0,1,0,0,0,1, ldraw_lib__1_4chrd()],
// 4 16 -36.5 -.25 -17.5 -36.5 -.25 17.5 -37.5 -.25 16.5 -37.5 -.25 -16.5
  [4,16,-36.5,-.25,-17.5,-36.5,-.25,17.5,-37.5,-.25,16.5,-37.5,-.25,-16.5],
// 4 16 -16.6 -.25 -1.6 -36.5 -.25 17.5 -36.5 -.25 -17.5 -22.8 -.25 -10.5
  [4,16,-16.6,-.25,-1.6,-36.5,-.25,17.5,-36.5,-.25,-17.5,-22.8,-.25,-10.5],
// 3 16 36.5 -.25 17.5 37.5 -.25 -16.5 37.5 -.25 16.5
  [3,16,36.5,-.25,17.5,37.5,-.25,-16.5,37.5,-.25,16.5],
// 4 16 34.3 -.25 -10.5 36.5 -.25 -17.5 37.5 -.25 -16.5 36.5 -.25 17.5
  [4,16,34.3,-.25,-10.5,36.5,-.25,-17.5,37.5,-.25,-16.5,36.5,-.25,17.5],
// 3 16 36.5 -.25 17.5 26 -.25 11.7 34.3 -.25 -10.5
  [3,16,36.5,-.25,17.5,26,-.25,11.7,34.3,-.25,-10.5],
// 4 16 36.5 -.25 17.5 -36.5 -.25 17.5 -16.6 -.25 -1.6 26 -.25 11.7
  [4,16,36.5,-.25,17.5,-36.5,-.25,17.5,-16.6,-.25,-1.6,26,-.25,11.7],
// 4 16 -22.8 -.25 -10.5 -36.5 -.25 -17.5 36.5 -.25 -17.5 34.3 -.25 -10.5
  [4,16,-22.8,-.25,-10.5,-36.5,-.25,-17.5,36.5,-.25,-17.5,34.3,-.25,-10.5],
// 
// 0 BFC NOCLIP
  [0,"BFC","NOCLIP"],
// 4 191 26 -.25 11.7 -16.6 -.25 -1.6 -22.8 -.25 -10.5 34.3 -.25 -10.5
  [4,191,26,-.25,11.7,-16.6,-.25,-1.6,-22.8,-.25,-10.5,34.3,-.25,-10.5],
];
module ldraw_lib__6347356m(step=0, col=false, unit=2/5, alt=false, line=0.2, solid=!$preview)
    makepoly(ldraw_lib__6347356m(), step=step, col=col, unit=unit, alt=alt, line=line, solid=solid);
ldraw_lib__6347356m(line=0.2);
// main file
use <../lib.scad>
use <6347356m.scad>
use <87079.scad>
function ldraw_lib__87079d05() = [
// 0 Tile  2 x  4 with Bright Light Orange Trapezoid Left Sticker
// 0 Name: 87079d05.dat
// 0 Author: Evert-Jan Boer [ejboer]
// 0 !LDRAW_ORG Shortcut UPDATE 2024-07
// 0 !LICENSE Licensed under CC BY 4.0 : see CAreadme.txt
// 
// 0 BFC CERTIFY CCW
  [0,"BFC","CERTIFY"],
  [0,"BFC","CCW"],
// 
// 0 !CATEGORY Sticker Shortcut
// 0 !KEYWORDS Republic Gunship, Set 75309, Star Wars
// 
// 0 !HISTORY 2024-08-26 [OrionP] Official Update 2024-07
// 
// 1 16 0 0 0 1 0 0 0 1 0 0 0 1 87079.dat
  [1,16,0,0,0,1,0,0,0,1,0,0,0,1, ldraw_lib__87079()],
// 1 16 0 0 0 1 0 0 0 1 0 0 0 1 6347356m.dat
  [1,16,0,0,0,1,0,0,0,1,0,0,0,1, ldraw_lib__6347356m()],
];
module ldraw_lib__87079d05(step=0, col=false, unit=2/5, alt=false, line=0.2, solid=!$preview)
    makepoly(ldraw_lib__87079d05(), step=step, col=col, unit=unit, alt=alt, line=line, solid=solid);
ldraw_lib__87079d05(line=0.2);
